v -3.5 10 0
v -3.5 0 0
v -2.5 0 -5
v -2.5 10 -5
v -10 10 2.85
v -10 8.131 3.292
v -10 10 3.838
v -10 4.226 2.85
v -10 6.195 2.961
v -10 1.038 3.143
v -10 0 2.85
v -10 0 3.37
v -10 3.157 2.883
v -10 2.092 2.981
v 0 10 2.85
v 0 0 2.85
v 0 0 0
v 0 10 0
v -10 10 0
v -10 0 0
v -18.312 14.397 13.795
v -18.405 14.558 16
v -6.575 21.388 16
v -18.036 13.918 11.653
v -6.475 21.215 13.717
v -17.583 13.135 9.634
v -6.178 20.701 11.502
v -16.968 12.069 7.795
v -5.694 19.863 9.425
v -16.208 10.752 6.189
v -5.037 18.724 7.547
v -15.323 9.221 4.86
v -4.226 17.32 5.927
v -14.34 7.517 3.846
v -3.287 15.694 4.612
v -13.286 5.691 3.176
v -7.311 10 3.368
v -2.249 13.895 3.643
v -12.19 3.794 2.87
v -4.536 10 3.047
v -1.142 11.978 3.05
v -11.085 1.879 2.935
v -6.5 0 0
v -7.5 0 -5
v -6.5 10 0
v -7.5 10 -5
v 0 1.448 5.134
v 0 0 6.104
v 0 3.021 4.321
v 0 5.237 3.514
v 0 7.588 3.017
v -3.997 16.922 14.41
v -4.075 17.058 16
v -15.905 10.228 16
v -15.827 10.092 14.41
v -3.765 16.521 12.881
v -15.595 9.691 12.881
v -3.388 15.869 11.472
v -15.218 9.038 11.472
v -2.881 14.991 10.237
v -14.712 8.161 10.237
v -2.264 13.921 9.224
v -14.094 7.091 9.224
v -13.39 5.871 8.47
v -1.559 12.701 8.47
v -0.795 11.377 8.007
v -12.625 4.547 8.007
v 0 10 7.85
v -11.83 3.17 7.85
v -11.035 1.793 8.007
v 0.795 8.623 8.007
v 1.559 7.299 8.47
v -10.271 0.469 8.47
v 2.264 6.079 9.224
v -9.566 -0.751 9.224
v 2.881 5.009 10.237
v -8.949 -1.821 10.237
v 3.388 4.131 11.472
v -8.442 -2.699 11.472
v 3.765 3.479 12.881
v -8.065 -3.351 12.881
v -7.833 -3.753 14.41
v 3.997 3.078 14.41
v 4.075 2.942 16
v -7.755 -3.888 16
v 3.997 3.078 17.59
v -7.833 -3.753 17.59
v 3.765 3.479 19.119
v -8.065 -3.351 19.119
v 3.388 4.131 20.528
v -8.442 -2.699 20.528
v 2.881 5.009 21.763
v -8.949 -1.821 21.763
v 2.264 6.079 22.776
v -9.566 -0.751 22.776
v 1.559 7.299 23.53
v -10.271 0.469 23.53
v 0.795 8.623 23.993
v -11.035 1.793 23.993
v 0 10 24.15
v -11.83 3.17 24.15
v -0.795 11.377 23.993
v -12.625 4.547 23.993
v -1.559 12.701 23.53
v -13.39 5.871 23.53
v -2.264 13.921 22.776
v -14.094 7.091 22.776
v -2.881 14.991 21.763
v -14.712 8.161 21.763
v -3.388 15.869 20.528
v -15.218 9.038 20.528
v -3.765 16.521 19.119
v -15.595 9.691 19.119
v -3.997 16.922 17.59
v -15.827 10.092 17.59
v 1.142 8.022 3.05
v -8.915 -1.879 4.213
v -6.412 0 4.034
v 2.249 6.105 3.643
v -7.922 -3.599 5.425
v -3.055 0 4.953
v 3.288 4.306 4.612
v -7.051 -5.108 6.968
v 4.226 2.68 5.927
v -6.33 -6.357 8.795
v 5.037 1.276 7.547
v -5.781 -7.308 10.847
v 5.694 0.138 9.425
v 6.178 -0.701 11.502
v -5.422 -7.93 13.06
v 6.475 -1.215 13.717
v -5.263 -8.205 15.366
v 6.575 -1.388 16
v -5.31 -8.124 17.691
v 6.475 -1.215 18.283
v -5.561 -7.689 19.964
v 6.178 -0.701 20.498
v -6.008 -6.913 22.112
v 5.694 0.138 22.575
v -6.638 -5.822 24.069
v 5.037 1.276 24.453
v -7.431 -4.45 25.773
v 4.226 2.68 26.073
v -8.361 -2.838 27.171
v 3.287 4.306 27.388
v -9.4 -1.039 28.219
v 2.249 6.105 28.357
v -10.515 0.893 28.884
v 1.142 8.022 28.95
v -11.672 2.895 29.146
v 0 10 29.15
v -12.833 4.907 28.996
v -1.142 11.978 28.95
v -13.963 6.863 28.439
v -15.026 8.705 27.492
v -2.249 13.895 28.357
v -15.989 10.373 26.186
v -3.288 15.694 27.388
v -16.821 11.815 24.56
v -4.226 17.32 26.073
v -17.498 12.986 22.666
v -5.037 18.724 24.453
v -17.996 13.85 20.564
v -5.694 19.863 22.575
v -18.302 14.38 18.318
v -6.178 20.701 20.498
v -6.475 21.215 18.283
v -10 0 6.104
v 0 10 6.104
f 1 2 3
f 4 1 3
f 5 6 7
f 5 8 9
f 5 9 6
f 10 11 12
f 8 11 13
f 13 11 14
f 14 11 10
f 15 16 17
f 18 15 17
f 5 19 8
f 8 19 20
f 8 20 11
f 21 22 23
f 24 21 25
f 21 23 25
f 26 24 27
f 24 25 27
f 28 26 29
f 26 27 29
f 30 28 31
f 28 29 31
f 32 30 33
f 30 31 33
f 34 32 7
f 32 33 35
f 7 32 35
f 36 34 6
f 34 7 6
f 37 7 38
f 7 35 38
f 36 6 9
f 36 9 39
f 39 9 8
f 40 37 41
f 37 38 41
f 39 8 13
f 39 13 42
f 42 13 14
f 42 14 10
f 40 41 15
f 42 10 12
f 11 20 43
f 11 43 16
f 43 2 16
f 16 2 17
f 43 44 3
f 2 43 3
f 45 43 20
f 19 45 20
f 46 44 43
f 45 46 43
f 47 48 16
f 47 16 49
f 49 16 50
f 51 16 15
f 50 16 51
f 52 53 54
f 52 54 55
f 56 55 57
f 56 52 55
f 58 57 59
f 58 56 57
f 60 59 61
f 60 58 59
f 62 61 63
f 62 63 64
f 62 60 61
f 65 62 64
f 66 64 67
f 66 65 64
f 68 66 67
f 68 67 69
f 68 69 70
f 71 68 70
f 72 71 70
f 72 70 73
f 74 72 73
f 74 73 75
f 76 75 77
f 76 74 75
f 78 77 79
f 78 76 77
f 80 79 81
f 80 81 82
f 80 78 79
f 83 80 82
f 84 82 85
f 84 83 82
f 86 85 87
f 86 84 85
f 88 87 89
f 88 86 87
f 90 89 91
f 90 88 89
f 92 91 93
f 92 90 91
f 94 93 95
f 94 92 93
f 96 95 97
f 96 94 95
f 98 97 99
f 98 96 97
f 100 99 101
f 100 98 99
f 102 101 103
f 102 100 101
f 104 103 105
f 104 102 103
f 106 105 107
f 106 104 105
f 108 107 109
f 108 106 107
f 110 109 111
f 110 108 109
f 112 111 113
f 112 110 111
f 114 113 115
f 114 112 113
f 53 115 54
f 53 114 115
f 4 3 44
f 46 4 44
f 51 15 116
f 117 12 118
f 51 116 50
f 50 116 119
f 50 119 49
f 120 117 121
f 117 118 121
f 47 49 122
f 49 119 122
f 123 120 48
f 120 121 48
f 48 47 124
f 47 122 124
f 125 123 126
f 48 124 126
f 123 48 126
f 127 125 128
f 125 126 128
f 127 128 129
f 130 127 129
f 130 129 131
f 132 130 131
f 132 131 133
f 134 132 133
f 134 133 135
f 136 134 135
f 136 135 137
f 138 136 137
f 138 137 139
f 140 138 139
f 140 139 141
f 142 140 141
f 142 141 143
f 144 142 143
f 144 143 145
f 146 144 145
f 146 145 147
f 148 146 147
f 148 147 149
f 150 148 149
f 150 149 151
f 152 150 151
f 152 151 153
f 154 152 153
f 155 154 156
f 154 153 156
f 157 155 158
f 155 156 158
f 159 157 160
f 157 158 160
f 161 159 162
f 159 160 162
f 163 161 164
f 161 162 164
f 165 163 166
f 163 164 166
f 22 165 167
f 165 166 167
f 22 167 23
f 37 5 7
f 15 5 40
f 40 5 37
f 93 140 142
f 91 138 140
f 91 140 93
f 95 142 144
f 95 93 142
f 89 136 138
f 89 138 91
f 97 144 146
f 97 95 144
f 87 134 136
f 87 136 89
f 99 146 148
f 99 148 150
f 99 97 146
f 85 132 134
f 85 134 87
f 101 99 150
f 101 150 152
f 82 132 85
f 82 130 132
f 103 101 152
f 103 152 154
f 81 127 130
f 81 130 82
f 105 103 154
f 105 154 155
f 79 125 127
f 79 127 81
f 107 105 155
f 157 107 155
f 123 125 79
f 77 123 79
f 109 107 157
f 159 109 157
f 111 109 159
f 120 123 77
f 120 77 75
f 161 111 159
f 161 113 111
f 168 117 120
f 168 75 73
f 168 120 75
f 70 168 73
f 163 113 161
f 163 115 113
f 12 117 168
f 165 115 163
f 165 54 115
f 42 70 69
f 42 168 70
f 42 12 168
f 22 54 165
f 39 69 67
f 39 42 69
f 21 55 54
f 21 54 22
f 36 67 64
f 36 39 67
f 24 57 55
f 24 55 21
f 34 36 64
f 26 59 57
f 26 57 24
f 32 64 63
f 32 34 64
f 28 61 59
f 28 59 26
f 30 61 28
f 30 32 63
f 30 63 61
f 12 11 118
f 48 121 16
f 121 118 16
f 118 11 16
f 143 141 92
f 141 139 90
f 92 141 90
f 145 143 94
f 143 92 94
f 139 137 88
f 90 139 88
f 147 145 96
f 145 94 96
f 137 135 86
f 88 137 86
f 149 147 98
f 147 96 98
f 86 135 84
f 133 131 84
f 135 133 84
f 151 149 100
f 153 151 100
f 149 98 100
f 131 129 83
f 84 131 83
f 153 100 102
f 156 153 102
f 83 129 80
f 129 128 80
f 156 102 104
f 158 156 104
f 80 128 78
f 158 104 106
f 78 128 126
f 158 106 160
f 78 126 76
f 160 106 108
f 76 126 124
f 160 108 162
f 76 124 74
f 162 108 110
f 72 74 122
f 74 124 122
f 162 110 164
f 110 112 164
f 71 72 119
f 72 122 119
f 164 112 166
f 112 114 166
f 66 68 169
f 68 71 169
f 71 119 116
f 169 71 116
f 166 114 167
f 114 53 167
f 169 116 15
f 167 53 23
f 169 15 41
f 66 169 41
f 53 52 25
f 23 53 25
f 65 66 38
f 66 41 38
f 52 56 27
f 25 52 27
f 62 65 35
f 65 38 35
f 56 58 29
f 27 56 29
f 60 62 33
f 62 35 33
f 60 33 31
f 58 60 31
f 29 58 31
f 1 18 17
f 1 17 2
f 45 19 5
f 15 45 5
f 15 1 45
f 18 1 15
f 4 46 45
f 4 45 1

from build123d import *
from build123d.topology import SkipClean

# Parameters (mm, degrees)
BOSS_EXTRUDE1_DEPTH     = 10
SKETCH2_R               = 13.15
SKETCH2_R_2             = 8.15
BOSS_EXTRUDE2_DEPTH     = 13.660254
BOSS_EXTRUDE4_OUTLINE_W = 10
BOSS_EXTRUDE4_OUTLINE_H = 10
BOSS_EXTRUDE4_DEPTH     = 3.254420179


# Read off the part's stored shape, not the designer's step: Boss-Extrude4
with BuildPart() as part:
    # Sketch1 → Boss-Extrude1 (new body)
    with BuildSketch(Plane(origin=(0, 0, 0), x_dir=(1, 0, 0), z_dir=(0, 1, 0))):
        Polygon((-5, -2.85), (-5, 5), (-7.5, 5), (-6.5, 0), (-10, 0), (-10, -2.85), align=None)
        Polygon((0, 0), (-3.5, 0), (-2.5, 5), (-5, 5), (-5, -2.85), (0, -2.85), align=None)
    extrude(amount=BOSS_EXTRUDE1_DEPTH)



with BuildPart() as body_2:
    # Sketch2 → Boss-Extrude2 (new body)
    with BuildSketch(Plane(origin=(4.330127019, 2.5, 0), x_dir=(0, 0, -1), z_dir=(-0.8660254037844362, -0.5000000000000041, 0))):
        with Locations(Location((-16, -8.660254038, 0), (0, 0, 270))):
            Circle(SKETCH2_R)
        with Locations(Location((-16, -8.660254038, 0), (0, 0, 270))):
            Circle(SKETCH2_R_2, mode=Mode.SUBTRACT)
    extrude(amount=BOSS_EXTRUDE2_DEPTH)


with BuildPart() as part_1:
    with SkipClean():  # the faces are left unmerged after this step: merging them gives an invalid solid
        add(part.part)

        add(body_2.part)  # Boss-Extrude4 merges body 2
        # Boss-Extrude4 outline → Boss-Extrude4 (add)
        with BuildSketch(Plane.XY.offset(2.85)):
            with Locations((-5, 5)):
                Rectangle(BOSS_EXTRUDE4_OUTLINE_W, BOSS_EXTRUDE4_OUTLINE_H)
        extrude(amount=BOSS_EXTRUDE4_DEPTH)


solid = part_1.part
